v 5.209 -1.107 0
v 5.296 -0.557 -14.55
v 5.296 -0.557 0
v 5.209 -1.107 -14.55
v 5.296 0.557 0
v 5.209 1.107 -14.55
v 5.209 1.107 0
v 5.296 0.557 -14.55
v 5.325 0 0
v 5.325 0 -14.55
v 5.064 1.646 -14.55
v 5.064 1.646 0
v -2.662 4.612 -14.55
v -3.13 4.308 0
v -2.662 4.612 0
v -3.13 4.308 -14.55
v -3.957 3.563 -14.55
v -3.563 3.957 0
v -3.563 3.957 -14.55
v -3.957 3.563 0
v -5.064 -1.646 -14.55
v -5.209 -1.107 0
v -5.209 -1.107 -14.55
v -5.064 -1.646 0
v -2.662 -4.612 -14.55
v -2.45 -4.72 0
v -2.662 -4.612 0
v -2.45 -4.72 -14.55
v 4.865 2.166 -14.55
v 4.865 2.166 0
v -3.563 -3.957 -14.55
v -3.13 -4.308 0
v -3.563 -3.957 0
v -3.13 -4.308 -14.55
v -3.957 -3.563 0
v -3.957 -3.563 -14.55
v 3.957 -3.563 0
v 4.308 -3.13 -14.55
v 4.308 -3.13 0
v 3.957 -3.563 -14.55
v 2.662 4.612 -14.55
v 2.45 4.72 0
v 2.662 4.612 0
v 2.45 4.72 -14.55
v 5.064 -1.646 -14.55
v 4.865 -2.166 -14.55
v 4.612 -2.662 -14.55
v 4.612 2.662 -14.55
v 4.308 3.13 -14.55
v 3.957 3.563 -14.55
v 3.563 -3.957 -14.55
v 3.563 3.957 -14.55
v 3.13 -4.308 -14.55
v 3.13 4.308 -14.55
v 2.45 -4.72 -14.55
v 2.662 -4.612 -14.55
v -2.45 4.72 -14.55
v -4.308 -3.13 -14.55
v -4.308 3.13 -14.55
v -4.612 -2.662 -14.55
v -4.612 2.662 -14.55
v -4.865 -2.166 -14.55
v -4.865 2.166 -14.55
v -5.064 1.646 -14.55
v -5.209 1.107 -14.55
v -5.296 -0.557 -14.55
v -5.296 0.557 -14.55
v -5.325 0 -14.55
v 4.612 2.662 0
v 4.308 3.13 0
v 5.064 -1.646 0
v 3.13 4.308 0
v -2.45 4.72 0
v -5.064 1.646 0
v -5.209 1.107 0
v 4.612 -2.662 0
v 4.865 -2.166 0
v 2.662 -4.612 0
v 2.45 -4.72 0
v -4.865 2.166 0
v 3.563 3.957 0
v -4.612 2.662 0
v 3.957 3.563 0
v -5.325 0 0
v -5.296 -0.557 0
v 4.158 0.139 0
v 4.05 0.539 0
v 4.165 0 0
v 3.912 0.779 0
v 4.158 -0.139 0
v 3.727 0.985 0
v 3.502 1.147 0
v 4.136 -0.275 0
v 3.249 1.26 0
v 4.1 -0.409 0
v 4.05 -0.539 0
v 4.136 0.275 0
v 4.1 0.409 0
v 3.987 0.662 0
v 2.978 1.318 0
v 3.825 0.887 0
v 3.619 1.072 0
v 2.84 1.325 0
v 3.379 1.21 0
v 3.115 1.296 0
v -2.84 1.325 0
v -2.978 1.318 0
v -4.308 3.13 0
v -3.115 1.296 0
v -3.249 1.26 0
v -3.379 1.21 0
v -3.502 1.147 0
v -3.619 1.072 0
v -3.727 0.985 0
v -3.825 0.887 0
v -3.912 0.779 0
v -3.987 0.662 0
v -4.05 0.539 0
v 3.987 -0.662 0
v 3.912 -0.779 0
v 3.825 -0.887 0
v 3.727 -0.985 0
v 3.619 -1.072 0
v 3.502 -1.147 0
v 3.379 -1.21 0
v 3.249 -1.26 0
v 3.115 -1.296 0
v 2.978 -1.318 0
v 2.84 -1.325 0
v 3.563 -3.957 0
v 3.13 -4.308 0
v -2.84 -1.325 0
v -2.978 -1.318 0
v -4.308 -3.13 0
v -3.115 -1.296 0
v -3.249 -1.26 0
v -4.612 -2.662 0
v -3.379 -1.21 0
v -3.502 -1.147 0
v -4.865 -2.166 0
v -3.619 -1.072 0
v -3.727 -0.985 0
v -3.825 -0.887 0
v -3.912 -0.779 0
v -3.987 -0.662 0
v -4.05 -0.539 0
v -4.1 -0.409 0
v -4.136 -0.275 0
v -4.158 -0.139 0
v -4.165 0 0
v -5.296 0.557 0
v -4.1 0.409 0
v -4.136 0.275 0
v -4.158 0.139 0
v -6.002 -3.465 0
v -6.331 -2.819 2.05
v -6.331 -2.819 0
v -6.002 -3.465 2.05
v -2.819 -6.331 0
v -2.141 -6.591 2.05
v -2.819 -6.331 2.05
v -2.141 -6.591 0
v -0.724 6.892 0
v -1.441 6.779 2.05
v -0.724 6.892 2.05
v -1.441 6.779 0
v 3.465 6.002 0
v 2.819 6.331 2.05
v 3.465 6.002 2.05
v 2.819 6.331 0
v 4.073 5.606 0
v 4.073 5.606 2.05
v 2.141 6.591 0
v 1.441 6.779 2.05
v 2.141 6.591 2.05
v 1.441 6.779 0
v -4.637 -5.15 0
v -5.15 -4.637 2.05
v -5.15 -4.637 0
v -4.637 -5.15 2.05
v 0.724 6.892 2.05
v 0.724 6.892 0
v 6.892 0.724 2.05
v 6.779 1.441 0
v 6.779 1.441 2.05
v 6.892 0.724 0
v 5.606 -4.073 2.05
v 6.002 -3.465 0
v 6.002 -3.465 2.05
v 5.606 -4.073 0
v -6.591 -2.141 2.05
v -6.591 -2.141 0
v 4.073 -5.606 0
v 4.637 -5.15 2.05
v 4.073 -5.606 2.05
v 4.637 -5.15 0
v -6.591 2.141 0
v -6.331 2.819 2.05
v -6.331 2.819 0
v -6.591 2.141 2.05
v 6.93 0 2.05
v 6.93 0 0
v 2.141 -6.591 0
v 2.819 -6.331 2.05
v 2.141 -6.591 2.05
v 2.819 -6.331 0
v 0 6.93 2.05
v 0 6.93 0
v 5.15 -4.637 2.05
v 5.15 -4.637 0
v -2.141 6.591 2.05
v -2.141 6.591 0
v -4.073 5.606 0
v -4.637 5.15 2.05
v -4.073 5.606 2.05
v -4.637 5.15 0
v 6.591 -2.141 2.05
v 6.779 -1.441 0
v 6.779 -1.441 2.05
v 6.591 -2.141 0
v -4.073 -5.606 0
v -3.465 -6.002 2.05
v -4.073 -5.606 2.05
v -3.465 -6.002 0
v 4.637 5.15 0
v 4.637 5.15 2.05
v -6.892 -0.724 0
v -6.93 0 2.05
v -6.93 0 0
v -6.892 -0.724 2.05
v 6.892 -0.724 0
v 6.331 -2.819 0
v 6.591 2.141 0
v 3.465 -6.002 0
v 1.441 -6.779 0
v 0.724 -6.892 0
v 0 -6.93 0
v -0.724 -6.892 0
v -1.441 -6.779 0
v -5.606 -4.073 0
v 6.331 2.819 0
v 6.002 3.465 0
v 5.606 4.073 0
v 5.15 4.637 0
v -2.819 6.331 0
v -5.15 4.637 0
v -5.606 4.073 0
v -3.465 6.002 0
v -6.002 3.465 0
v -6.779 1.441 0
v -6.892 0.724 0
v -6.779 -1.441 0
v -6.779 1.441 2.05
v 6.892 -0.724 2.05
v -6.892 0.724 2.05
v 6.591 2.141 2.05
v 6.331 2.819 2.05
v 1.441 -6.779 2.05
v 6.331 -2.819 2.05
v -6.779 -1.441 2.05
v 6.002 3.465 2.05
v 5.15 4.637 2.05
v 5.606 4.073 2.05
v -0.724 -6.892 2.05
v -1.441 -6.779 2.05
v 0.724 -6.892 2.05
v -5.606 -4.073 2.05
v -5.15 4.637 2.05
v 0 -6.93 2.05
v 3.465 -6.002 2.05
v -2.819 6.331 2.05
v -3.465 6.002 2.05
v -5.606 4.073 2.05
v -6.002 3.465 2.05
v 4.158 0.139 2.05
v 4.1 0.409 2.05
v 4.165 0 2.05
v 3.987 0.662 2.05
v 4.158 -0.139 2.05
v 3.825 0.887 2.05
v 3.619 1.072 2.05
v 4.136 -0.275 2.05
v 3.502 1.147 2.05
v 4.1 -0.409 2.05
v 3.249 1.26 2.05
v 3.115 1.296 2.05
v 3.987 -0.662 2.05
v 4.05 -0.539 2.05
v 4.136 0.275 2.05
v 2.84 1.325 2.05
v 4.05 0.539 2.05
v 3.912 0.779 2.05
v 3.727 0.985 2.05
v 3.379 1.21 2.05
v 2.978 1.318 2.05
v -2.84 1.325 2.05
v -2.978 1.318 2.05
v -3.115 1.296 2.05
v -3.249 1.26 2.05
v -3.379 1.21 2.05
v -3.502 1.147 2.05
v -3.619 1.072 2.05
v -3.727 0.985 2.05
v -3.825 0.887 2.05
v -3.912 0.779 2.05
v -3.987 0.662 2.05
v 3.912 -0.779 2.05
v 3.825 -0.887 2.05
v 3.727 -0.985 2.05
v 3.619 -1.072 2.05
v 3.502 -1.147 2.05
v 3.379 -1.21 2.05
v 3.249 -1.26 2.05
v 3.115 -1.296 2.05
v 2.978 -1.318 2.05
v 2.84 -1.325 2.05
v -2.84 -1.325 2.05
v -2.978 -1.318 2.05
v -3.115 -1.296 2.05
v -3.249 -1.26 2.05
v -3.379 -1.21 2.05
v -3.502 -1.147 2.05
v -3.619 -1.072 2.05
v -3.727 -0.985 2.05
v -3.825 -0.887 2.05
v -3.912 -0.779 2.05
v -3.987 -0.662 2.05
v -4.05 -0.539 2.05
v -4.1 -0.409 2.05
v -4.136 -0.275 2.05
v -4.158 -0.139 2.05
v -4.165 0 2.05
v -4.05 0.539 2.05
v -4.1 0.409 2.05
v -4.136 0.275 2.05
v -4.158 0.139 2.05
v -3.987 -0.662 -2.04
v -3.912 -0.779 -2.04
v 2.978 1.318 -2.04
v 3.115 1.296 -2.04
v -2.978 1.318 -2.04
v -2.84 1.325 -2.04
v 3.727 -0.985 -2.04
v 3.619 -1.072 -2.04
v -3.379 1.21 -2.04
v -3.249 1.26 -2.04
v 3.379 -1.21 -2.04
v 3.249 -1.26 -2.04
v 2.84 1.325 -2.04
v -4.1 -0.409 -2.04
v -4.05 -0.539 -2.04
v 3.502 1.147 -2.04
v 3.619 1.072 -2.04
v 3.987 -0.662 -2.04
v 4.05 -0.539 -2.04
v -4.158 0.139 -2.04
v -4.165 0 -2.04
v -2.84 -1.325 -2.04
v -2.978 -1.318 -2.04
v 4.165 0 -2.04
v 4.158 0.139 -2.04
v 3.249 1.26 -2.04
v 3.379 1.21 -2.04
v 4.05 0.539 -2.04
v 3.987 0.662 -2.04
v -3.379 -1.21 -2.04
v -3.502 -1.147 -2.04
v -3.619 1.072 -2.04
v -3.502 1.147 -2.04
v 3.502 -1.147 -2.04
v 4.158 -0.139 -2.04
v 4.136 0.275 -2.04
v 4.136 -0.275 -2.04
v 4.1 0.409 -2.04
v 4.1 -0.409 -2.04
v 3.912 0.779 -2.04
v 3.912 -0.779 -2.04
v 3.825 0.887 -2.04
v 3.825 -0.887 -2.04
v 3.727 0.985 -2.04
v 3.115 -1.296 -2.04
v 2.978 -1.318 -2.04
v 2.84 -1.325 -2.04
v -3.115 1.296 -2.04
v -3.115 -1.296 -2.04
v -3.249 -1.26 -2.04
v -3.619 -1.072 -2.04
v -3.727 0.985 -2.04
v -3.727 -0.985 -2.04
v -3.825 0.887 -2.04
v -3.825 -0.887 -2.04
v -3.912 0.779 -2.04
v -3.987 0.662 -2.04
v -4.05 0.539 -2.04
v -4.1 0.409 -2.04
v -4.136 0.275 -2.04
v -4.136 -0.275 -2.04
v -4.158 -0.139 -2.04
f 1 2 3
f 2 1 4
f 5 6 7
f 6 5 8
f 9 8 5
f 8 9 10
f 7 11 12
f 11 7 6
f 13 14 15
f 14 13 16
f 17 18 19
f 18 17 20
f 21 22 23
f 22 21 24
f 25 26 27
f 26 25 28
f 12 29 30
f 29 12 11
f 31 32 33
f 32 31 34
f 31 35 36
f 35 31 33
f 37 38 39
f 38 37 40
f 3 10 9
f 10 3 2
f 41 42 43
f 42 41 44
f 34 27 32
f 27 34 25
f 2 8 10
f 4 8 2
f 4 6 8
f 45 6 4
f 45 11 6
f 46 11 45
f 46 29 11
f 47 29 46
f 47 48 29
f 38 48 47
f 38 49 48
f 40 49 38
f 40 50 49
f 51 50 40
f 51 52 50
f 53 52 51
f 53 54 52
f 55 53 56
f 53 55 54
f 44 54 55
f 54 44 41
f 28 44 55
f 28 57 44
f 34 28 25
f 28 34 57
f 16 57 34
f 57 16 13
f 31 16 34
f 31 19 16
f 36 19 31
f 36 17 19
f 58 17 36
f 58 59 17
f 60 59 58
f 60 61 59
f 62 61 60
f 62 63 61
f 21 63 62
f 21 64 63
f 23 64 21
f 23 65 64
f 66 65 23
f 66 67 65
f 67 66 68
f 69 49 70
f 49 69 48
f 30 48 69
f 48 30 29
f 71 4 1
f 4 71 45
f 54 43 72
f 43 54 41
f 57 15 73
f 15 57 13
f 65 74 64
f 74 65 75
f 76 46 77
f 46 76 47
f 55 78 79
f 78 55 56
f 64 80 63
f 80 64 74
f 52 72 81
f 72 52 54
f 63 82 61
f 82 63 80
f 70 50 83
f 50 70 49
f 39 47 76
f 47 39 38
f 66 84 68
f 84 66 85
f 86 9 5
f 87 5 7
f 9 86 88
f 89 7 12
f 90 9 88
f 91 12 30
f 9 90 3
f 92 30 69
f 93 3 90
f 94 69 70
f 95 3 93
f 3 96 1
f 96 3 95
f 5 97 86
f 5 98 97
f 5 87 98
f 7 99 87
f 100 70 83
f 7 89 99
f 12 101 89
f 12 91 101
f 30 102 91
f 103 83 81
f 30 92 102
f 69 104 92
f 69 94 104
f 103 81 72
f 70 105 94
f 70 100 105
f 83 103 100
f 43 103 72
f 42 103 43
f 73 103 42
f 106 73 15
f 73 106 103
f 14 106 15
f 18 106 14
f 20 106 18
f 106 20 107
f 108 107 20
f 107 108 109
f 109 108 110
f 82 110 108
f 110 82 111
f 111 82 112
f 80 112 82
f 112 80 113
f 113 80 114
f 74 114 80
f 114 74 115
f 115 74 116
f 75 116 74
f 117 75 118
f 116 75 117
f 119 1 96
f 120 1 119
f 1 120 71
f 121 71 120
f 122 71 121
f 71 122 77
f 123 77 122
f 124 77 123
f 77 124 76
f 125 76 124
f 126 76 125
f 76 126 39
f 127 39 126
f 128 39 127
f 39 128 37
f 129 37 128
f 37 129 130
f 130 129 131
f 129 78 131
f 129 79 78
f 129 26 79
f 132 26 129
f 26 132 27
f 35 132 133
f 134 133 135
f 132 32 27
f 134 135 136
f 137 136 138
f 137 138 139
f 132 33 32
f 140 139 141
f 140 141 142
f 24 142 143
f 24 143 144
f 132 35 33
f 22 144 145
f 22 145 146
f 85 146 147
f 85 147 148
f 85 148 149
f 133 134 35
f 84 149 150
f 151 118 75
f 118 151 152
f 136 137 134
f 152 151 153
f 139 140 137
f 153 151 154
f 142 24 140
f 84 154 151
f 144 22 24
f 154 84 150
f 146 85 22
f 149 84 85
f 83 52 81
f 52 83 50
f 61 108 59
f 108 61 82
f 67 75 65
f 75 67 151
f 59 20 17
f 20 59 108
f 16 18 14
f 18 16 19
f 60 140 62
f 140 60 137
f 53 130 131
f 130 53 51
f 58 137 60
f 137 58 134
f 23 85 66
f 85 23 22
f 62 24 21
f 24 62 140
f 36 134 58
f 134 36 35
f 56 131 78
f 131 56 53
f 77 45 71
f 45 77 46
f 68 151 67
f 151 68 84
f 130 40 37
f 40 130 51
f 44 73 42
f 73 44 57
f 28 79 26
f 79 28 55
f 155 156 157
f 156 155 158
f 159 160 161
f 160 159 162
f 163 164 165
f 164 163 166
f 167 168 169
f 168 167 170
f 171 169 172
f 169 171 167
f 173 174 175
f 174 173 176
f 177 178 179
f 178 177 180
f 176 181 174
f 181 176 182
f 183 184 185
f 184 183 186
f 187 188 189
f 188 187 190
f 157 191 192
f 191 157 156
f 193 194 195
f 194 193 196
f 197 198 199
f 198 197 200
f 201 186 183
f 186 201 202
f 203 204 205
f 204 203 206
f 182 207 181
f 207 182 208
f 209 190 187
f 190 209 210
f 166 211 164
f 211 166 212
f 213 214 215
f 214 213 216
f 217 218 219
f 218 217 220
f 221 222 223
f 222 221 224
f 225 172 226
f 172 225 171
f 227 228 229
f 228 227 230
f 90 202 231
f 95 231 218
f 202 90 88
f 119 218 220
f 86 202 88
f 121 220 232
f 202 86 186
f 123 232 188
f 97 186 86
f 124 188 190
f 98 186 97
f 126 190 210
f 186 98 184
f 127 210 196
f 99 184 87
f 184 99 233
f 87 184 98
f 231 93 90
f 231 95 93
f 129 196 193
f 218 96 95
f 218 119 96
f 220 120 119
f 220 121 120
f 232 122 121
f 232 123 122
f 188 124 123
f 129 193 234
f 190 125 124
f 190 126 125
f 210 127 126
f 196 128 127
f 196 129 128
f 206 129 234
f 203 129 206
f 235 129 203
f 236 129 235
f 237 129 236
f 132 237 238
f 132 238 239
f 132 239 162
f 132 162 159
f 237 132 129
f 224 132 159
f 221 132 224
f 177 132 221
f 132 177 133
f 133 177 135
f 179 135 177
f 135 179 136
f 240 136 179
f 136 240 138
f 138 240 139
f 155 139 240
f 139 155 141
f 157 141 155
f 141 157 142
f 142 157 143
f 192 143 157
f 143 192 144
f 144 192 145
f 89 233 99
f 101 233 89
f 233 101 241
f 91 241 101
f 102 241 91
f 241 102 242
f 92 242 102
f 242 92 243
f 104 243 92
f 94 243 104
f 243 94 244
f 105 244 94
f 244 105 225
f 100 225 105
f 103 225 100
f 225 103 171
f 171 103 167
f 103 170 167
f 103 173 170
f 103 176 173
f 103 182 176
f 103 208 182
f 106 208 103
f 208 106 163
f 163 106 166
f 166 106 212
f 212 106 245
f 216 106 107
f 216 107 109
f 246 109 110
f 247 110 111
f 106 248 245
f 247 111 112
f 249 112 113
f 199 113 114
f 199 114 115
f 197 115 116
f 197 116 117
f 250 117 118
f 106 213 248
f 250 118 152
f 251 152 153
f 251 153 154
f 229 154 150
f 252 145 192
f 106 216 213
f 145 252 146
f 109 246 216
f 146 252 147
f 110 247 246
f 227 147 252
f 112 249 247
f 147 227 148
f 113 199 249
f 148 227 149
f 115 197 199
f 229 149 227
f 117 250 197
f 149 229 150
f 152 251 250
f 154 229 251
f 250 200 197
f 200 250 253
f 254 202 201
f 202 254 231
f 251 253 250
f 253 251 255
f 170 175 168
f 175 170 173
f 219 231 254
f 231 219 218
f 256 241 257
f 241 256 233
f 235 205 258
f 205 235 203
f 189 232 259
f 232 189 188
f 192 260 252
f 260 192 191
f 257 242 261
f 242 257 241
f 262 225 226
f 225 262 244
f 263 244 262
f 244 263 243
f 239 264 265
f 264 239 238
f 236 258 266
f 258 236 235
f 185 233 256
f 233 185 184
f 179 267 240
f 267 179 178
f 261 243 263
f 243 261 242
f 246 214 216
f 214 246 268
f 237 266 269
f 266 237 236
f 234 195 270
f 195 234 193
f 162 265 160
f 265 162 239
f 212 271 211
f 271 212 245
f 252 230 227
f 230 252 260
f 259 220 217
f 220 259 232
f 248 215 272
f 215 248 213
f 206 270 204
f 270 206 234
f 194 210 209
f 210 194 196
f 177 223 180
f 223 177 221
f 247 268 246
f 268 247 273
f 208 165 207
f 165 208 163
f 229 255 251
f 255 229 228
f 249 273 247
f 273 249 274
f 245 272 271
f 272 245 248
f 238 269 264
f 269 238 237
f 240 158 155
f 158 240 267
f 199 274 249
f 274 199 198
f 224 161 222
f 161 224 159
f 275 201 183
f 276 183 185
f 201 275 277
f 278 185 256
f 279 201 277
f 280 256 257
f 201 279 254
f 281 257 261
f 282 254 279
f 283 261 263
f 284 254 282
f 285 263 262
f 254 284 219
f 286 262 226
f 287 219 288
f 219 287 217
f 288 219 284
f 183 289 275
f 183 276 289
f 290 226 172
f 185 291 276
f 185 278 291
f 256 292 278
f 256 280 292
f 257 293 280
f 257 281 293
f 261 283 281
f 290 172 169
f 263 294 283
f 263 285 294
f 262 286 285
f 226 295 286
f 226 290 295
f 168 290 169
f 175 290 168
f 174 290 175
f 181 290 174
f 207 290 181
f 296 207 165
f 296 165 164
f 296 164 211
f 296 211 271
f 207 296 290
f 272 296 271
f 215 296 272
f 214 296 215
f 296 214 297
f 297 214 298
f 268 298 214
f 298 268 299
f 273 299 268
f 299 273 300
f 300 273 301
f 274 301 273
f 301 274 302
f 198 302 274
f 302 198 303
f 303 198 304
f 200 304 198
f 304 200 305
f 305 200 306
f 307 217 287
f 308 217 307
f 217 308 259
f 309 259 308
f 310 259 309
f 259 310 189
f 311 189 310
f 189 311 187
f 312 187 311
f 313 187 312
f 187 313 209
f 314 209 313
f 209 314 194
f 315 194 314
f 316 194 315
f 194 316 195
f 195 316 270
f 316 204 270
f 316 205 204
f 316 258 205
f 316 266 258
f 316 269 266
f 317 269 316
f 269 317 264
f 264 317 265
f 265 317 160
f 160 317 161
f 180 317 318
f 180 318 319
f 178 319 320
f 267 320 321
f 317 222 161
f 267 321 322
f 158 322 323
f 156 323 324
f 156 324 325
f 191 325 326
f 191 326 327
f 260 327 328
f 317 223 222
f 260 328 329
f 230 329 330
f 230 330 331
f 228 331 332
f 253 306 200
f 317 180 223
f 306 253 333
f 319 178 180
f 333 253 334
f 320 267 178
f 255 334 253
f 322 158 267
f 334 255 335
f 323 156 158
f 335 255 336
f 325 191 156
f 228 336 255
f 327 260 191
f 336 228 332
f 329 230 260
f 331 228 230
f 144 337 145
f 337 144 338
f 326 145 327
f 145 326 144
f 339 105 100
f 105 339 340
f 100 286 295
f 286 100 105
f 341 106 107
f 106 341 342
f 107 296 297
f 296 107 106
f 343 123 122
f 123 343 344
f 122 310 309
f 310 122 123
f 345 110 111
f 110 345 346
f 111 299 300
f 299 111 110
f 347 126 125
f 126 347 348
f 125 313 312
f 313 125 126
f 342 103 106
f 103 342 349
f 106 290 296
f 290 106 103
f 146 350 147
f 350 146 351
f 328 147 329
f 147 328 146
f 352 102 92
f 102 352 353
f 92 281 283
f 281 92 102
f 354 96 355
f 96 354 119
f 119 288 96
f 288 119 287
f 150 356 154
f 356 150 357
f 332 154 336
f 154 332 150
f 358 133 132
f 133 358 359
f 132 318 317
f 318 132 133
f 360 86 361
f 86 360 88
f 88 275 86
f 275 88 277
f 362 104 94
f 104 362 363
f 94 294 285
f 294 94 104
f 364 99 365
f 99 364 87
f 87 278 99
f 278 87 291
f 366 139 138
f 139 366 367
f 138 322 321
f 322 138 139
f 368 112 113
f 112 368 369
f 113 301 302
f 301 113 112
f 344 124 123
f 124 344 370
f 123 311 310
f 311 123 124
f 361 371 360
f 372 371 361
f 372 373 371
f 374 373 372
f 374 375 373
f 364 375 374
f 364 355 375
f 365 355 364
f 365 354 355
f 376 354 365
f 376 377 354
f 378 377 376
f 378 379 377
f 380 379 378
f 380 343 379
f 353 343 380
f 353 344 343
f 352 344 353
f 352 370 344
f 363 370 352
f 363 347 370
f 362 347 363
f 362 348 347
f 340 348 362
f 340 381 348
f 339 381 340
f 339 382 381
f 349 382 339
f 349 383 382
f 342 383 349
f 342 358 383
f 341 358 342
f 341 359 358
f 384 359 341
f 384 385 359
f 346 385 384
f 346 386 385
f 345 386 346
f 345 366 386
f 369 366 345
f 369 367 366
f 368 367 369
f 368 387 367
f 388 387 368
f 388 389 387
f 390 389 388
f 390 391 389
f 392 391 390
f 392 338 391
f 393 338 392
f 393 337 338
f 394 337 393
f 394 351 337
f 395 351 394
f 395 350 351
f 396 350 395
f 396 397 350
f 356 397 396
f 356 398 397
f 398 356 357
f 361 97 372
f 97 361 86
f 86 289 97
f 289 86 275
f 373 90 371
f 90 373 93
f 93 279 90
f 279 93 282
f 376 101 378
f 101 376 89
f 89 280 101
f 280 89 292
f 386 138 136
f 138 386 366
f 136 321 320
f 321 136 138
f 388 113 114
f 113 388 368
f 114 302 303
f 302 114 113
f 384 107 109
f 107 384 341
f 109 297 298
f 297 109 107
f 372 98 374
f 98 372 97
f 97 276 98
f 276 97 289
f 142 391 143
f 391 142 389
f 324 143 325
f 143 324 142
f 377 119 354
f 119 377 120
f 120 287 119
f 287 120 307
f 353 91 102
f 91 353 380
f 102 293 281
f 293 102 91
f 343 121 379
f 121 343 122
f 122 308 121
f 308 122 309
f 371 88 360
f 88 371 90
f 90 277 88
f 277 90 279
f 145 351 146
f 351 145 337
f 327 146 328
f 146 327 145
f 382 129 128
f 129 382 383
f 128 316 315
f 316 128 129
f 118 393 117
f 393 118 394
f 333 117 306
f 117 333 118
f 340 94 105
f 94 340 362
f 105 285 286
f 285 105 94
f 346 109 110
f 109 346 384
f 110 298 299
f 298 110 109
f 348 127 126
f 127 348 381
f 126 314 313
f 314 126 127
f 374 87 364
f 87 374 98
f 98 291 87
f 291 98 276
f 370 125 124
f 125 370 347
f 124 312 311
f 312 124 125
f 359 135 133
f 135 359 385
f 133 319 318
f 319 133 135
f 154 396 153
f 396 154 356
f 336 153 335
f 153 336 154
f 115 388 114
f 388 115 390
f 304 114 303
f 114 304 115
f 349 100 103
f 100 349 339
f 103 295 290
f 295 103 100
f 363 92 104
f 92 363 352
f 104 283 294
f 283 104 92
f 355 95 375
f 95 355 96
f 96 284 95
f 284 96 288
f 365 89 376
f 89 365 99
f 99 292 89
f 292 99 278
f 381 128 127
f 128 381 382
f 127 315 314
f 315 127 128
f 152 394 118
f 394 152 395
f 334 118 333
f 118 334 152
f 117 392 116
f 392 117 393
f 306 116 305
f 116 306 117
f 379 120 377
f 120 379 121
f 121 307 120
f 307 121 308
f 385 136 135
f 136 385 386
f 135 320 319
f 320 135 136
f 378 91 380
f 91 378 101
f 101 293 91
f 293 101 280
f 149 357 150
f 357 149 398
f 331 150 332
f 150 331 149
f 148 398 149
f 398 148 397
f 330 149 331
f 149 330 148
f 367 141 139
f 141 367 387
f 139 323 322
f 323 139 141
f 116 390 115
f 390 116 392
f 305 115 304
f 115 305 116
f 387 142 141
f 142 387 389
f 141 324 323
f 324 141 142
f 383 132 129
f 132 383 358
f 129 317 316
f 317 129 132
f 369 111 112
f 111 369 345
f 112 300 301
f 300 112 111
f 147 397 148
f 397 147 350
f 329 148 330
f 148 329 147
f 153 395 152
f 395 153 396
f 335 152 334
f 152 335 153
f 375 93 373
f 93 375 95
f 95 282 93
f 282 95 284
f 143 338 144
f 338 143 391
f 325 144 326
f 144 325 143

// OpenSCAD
// file: configurations.scad
usbConnector_total_z_size = 16.6;
usbConnector_head_z_size = 2.05;
usbConnector_head_diameter = 13.86;
usbConnector_bottom_part_diameter = 10.65;
usbConnector_bottom_part_flat_size = 9.44;
// main file
include <configurations.scad>


module usbConnector(
    total_z_size = usbConnector_total_z_size,
    head_z_size = usbConnector_head_z_size,
    head_diameter = usbConnector_head_diameter,
    bottom_part_diameter = usbConnector_bottom_part_diameter,
    bottom_part_flat_size = usbConnector_bottom_part_flat_size
) {

    epsilon = 0.01;
    
    // Bottom part
    bottom_part_z_size = total_z_size - head_z_size;

    // Head
    color("Grey")
        difference() {

            union() {
                cylinder(d = head_diameter, h = head_z_size, $fn = 60);
                translate([0, 0, -bottom_part_z_size])
                    intersection() {
                        cylinder(d = bottom_part_diameter, h = bottom_part_z_size, $fn = 60);
                        translate([-bottom_part_diameter / 2, -bottom_part_flat_size / 2, 0])
                            cube([bottom_part_diameter, bottom_part_flat_size, bottom_part_z_size]);
                    }
            }

            x_size_total = 8.33;
            u_diam = 2.65;

            hull() {
                translate([-x_size_total / 2 + u_diam / 2, 0, -head_z_size + epsilon])
                    cylinder(d = u_diam, h = head_z_size * 2, $fn = 60);

                translate([x_size_total / 2 - u_diam / 2, 0, -head_z_size + epsilon])
                    cylinder(d = u_diam, h = head_z_size * 2, $fn = 60);
            }
        }
}

usbConnector();
